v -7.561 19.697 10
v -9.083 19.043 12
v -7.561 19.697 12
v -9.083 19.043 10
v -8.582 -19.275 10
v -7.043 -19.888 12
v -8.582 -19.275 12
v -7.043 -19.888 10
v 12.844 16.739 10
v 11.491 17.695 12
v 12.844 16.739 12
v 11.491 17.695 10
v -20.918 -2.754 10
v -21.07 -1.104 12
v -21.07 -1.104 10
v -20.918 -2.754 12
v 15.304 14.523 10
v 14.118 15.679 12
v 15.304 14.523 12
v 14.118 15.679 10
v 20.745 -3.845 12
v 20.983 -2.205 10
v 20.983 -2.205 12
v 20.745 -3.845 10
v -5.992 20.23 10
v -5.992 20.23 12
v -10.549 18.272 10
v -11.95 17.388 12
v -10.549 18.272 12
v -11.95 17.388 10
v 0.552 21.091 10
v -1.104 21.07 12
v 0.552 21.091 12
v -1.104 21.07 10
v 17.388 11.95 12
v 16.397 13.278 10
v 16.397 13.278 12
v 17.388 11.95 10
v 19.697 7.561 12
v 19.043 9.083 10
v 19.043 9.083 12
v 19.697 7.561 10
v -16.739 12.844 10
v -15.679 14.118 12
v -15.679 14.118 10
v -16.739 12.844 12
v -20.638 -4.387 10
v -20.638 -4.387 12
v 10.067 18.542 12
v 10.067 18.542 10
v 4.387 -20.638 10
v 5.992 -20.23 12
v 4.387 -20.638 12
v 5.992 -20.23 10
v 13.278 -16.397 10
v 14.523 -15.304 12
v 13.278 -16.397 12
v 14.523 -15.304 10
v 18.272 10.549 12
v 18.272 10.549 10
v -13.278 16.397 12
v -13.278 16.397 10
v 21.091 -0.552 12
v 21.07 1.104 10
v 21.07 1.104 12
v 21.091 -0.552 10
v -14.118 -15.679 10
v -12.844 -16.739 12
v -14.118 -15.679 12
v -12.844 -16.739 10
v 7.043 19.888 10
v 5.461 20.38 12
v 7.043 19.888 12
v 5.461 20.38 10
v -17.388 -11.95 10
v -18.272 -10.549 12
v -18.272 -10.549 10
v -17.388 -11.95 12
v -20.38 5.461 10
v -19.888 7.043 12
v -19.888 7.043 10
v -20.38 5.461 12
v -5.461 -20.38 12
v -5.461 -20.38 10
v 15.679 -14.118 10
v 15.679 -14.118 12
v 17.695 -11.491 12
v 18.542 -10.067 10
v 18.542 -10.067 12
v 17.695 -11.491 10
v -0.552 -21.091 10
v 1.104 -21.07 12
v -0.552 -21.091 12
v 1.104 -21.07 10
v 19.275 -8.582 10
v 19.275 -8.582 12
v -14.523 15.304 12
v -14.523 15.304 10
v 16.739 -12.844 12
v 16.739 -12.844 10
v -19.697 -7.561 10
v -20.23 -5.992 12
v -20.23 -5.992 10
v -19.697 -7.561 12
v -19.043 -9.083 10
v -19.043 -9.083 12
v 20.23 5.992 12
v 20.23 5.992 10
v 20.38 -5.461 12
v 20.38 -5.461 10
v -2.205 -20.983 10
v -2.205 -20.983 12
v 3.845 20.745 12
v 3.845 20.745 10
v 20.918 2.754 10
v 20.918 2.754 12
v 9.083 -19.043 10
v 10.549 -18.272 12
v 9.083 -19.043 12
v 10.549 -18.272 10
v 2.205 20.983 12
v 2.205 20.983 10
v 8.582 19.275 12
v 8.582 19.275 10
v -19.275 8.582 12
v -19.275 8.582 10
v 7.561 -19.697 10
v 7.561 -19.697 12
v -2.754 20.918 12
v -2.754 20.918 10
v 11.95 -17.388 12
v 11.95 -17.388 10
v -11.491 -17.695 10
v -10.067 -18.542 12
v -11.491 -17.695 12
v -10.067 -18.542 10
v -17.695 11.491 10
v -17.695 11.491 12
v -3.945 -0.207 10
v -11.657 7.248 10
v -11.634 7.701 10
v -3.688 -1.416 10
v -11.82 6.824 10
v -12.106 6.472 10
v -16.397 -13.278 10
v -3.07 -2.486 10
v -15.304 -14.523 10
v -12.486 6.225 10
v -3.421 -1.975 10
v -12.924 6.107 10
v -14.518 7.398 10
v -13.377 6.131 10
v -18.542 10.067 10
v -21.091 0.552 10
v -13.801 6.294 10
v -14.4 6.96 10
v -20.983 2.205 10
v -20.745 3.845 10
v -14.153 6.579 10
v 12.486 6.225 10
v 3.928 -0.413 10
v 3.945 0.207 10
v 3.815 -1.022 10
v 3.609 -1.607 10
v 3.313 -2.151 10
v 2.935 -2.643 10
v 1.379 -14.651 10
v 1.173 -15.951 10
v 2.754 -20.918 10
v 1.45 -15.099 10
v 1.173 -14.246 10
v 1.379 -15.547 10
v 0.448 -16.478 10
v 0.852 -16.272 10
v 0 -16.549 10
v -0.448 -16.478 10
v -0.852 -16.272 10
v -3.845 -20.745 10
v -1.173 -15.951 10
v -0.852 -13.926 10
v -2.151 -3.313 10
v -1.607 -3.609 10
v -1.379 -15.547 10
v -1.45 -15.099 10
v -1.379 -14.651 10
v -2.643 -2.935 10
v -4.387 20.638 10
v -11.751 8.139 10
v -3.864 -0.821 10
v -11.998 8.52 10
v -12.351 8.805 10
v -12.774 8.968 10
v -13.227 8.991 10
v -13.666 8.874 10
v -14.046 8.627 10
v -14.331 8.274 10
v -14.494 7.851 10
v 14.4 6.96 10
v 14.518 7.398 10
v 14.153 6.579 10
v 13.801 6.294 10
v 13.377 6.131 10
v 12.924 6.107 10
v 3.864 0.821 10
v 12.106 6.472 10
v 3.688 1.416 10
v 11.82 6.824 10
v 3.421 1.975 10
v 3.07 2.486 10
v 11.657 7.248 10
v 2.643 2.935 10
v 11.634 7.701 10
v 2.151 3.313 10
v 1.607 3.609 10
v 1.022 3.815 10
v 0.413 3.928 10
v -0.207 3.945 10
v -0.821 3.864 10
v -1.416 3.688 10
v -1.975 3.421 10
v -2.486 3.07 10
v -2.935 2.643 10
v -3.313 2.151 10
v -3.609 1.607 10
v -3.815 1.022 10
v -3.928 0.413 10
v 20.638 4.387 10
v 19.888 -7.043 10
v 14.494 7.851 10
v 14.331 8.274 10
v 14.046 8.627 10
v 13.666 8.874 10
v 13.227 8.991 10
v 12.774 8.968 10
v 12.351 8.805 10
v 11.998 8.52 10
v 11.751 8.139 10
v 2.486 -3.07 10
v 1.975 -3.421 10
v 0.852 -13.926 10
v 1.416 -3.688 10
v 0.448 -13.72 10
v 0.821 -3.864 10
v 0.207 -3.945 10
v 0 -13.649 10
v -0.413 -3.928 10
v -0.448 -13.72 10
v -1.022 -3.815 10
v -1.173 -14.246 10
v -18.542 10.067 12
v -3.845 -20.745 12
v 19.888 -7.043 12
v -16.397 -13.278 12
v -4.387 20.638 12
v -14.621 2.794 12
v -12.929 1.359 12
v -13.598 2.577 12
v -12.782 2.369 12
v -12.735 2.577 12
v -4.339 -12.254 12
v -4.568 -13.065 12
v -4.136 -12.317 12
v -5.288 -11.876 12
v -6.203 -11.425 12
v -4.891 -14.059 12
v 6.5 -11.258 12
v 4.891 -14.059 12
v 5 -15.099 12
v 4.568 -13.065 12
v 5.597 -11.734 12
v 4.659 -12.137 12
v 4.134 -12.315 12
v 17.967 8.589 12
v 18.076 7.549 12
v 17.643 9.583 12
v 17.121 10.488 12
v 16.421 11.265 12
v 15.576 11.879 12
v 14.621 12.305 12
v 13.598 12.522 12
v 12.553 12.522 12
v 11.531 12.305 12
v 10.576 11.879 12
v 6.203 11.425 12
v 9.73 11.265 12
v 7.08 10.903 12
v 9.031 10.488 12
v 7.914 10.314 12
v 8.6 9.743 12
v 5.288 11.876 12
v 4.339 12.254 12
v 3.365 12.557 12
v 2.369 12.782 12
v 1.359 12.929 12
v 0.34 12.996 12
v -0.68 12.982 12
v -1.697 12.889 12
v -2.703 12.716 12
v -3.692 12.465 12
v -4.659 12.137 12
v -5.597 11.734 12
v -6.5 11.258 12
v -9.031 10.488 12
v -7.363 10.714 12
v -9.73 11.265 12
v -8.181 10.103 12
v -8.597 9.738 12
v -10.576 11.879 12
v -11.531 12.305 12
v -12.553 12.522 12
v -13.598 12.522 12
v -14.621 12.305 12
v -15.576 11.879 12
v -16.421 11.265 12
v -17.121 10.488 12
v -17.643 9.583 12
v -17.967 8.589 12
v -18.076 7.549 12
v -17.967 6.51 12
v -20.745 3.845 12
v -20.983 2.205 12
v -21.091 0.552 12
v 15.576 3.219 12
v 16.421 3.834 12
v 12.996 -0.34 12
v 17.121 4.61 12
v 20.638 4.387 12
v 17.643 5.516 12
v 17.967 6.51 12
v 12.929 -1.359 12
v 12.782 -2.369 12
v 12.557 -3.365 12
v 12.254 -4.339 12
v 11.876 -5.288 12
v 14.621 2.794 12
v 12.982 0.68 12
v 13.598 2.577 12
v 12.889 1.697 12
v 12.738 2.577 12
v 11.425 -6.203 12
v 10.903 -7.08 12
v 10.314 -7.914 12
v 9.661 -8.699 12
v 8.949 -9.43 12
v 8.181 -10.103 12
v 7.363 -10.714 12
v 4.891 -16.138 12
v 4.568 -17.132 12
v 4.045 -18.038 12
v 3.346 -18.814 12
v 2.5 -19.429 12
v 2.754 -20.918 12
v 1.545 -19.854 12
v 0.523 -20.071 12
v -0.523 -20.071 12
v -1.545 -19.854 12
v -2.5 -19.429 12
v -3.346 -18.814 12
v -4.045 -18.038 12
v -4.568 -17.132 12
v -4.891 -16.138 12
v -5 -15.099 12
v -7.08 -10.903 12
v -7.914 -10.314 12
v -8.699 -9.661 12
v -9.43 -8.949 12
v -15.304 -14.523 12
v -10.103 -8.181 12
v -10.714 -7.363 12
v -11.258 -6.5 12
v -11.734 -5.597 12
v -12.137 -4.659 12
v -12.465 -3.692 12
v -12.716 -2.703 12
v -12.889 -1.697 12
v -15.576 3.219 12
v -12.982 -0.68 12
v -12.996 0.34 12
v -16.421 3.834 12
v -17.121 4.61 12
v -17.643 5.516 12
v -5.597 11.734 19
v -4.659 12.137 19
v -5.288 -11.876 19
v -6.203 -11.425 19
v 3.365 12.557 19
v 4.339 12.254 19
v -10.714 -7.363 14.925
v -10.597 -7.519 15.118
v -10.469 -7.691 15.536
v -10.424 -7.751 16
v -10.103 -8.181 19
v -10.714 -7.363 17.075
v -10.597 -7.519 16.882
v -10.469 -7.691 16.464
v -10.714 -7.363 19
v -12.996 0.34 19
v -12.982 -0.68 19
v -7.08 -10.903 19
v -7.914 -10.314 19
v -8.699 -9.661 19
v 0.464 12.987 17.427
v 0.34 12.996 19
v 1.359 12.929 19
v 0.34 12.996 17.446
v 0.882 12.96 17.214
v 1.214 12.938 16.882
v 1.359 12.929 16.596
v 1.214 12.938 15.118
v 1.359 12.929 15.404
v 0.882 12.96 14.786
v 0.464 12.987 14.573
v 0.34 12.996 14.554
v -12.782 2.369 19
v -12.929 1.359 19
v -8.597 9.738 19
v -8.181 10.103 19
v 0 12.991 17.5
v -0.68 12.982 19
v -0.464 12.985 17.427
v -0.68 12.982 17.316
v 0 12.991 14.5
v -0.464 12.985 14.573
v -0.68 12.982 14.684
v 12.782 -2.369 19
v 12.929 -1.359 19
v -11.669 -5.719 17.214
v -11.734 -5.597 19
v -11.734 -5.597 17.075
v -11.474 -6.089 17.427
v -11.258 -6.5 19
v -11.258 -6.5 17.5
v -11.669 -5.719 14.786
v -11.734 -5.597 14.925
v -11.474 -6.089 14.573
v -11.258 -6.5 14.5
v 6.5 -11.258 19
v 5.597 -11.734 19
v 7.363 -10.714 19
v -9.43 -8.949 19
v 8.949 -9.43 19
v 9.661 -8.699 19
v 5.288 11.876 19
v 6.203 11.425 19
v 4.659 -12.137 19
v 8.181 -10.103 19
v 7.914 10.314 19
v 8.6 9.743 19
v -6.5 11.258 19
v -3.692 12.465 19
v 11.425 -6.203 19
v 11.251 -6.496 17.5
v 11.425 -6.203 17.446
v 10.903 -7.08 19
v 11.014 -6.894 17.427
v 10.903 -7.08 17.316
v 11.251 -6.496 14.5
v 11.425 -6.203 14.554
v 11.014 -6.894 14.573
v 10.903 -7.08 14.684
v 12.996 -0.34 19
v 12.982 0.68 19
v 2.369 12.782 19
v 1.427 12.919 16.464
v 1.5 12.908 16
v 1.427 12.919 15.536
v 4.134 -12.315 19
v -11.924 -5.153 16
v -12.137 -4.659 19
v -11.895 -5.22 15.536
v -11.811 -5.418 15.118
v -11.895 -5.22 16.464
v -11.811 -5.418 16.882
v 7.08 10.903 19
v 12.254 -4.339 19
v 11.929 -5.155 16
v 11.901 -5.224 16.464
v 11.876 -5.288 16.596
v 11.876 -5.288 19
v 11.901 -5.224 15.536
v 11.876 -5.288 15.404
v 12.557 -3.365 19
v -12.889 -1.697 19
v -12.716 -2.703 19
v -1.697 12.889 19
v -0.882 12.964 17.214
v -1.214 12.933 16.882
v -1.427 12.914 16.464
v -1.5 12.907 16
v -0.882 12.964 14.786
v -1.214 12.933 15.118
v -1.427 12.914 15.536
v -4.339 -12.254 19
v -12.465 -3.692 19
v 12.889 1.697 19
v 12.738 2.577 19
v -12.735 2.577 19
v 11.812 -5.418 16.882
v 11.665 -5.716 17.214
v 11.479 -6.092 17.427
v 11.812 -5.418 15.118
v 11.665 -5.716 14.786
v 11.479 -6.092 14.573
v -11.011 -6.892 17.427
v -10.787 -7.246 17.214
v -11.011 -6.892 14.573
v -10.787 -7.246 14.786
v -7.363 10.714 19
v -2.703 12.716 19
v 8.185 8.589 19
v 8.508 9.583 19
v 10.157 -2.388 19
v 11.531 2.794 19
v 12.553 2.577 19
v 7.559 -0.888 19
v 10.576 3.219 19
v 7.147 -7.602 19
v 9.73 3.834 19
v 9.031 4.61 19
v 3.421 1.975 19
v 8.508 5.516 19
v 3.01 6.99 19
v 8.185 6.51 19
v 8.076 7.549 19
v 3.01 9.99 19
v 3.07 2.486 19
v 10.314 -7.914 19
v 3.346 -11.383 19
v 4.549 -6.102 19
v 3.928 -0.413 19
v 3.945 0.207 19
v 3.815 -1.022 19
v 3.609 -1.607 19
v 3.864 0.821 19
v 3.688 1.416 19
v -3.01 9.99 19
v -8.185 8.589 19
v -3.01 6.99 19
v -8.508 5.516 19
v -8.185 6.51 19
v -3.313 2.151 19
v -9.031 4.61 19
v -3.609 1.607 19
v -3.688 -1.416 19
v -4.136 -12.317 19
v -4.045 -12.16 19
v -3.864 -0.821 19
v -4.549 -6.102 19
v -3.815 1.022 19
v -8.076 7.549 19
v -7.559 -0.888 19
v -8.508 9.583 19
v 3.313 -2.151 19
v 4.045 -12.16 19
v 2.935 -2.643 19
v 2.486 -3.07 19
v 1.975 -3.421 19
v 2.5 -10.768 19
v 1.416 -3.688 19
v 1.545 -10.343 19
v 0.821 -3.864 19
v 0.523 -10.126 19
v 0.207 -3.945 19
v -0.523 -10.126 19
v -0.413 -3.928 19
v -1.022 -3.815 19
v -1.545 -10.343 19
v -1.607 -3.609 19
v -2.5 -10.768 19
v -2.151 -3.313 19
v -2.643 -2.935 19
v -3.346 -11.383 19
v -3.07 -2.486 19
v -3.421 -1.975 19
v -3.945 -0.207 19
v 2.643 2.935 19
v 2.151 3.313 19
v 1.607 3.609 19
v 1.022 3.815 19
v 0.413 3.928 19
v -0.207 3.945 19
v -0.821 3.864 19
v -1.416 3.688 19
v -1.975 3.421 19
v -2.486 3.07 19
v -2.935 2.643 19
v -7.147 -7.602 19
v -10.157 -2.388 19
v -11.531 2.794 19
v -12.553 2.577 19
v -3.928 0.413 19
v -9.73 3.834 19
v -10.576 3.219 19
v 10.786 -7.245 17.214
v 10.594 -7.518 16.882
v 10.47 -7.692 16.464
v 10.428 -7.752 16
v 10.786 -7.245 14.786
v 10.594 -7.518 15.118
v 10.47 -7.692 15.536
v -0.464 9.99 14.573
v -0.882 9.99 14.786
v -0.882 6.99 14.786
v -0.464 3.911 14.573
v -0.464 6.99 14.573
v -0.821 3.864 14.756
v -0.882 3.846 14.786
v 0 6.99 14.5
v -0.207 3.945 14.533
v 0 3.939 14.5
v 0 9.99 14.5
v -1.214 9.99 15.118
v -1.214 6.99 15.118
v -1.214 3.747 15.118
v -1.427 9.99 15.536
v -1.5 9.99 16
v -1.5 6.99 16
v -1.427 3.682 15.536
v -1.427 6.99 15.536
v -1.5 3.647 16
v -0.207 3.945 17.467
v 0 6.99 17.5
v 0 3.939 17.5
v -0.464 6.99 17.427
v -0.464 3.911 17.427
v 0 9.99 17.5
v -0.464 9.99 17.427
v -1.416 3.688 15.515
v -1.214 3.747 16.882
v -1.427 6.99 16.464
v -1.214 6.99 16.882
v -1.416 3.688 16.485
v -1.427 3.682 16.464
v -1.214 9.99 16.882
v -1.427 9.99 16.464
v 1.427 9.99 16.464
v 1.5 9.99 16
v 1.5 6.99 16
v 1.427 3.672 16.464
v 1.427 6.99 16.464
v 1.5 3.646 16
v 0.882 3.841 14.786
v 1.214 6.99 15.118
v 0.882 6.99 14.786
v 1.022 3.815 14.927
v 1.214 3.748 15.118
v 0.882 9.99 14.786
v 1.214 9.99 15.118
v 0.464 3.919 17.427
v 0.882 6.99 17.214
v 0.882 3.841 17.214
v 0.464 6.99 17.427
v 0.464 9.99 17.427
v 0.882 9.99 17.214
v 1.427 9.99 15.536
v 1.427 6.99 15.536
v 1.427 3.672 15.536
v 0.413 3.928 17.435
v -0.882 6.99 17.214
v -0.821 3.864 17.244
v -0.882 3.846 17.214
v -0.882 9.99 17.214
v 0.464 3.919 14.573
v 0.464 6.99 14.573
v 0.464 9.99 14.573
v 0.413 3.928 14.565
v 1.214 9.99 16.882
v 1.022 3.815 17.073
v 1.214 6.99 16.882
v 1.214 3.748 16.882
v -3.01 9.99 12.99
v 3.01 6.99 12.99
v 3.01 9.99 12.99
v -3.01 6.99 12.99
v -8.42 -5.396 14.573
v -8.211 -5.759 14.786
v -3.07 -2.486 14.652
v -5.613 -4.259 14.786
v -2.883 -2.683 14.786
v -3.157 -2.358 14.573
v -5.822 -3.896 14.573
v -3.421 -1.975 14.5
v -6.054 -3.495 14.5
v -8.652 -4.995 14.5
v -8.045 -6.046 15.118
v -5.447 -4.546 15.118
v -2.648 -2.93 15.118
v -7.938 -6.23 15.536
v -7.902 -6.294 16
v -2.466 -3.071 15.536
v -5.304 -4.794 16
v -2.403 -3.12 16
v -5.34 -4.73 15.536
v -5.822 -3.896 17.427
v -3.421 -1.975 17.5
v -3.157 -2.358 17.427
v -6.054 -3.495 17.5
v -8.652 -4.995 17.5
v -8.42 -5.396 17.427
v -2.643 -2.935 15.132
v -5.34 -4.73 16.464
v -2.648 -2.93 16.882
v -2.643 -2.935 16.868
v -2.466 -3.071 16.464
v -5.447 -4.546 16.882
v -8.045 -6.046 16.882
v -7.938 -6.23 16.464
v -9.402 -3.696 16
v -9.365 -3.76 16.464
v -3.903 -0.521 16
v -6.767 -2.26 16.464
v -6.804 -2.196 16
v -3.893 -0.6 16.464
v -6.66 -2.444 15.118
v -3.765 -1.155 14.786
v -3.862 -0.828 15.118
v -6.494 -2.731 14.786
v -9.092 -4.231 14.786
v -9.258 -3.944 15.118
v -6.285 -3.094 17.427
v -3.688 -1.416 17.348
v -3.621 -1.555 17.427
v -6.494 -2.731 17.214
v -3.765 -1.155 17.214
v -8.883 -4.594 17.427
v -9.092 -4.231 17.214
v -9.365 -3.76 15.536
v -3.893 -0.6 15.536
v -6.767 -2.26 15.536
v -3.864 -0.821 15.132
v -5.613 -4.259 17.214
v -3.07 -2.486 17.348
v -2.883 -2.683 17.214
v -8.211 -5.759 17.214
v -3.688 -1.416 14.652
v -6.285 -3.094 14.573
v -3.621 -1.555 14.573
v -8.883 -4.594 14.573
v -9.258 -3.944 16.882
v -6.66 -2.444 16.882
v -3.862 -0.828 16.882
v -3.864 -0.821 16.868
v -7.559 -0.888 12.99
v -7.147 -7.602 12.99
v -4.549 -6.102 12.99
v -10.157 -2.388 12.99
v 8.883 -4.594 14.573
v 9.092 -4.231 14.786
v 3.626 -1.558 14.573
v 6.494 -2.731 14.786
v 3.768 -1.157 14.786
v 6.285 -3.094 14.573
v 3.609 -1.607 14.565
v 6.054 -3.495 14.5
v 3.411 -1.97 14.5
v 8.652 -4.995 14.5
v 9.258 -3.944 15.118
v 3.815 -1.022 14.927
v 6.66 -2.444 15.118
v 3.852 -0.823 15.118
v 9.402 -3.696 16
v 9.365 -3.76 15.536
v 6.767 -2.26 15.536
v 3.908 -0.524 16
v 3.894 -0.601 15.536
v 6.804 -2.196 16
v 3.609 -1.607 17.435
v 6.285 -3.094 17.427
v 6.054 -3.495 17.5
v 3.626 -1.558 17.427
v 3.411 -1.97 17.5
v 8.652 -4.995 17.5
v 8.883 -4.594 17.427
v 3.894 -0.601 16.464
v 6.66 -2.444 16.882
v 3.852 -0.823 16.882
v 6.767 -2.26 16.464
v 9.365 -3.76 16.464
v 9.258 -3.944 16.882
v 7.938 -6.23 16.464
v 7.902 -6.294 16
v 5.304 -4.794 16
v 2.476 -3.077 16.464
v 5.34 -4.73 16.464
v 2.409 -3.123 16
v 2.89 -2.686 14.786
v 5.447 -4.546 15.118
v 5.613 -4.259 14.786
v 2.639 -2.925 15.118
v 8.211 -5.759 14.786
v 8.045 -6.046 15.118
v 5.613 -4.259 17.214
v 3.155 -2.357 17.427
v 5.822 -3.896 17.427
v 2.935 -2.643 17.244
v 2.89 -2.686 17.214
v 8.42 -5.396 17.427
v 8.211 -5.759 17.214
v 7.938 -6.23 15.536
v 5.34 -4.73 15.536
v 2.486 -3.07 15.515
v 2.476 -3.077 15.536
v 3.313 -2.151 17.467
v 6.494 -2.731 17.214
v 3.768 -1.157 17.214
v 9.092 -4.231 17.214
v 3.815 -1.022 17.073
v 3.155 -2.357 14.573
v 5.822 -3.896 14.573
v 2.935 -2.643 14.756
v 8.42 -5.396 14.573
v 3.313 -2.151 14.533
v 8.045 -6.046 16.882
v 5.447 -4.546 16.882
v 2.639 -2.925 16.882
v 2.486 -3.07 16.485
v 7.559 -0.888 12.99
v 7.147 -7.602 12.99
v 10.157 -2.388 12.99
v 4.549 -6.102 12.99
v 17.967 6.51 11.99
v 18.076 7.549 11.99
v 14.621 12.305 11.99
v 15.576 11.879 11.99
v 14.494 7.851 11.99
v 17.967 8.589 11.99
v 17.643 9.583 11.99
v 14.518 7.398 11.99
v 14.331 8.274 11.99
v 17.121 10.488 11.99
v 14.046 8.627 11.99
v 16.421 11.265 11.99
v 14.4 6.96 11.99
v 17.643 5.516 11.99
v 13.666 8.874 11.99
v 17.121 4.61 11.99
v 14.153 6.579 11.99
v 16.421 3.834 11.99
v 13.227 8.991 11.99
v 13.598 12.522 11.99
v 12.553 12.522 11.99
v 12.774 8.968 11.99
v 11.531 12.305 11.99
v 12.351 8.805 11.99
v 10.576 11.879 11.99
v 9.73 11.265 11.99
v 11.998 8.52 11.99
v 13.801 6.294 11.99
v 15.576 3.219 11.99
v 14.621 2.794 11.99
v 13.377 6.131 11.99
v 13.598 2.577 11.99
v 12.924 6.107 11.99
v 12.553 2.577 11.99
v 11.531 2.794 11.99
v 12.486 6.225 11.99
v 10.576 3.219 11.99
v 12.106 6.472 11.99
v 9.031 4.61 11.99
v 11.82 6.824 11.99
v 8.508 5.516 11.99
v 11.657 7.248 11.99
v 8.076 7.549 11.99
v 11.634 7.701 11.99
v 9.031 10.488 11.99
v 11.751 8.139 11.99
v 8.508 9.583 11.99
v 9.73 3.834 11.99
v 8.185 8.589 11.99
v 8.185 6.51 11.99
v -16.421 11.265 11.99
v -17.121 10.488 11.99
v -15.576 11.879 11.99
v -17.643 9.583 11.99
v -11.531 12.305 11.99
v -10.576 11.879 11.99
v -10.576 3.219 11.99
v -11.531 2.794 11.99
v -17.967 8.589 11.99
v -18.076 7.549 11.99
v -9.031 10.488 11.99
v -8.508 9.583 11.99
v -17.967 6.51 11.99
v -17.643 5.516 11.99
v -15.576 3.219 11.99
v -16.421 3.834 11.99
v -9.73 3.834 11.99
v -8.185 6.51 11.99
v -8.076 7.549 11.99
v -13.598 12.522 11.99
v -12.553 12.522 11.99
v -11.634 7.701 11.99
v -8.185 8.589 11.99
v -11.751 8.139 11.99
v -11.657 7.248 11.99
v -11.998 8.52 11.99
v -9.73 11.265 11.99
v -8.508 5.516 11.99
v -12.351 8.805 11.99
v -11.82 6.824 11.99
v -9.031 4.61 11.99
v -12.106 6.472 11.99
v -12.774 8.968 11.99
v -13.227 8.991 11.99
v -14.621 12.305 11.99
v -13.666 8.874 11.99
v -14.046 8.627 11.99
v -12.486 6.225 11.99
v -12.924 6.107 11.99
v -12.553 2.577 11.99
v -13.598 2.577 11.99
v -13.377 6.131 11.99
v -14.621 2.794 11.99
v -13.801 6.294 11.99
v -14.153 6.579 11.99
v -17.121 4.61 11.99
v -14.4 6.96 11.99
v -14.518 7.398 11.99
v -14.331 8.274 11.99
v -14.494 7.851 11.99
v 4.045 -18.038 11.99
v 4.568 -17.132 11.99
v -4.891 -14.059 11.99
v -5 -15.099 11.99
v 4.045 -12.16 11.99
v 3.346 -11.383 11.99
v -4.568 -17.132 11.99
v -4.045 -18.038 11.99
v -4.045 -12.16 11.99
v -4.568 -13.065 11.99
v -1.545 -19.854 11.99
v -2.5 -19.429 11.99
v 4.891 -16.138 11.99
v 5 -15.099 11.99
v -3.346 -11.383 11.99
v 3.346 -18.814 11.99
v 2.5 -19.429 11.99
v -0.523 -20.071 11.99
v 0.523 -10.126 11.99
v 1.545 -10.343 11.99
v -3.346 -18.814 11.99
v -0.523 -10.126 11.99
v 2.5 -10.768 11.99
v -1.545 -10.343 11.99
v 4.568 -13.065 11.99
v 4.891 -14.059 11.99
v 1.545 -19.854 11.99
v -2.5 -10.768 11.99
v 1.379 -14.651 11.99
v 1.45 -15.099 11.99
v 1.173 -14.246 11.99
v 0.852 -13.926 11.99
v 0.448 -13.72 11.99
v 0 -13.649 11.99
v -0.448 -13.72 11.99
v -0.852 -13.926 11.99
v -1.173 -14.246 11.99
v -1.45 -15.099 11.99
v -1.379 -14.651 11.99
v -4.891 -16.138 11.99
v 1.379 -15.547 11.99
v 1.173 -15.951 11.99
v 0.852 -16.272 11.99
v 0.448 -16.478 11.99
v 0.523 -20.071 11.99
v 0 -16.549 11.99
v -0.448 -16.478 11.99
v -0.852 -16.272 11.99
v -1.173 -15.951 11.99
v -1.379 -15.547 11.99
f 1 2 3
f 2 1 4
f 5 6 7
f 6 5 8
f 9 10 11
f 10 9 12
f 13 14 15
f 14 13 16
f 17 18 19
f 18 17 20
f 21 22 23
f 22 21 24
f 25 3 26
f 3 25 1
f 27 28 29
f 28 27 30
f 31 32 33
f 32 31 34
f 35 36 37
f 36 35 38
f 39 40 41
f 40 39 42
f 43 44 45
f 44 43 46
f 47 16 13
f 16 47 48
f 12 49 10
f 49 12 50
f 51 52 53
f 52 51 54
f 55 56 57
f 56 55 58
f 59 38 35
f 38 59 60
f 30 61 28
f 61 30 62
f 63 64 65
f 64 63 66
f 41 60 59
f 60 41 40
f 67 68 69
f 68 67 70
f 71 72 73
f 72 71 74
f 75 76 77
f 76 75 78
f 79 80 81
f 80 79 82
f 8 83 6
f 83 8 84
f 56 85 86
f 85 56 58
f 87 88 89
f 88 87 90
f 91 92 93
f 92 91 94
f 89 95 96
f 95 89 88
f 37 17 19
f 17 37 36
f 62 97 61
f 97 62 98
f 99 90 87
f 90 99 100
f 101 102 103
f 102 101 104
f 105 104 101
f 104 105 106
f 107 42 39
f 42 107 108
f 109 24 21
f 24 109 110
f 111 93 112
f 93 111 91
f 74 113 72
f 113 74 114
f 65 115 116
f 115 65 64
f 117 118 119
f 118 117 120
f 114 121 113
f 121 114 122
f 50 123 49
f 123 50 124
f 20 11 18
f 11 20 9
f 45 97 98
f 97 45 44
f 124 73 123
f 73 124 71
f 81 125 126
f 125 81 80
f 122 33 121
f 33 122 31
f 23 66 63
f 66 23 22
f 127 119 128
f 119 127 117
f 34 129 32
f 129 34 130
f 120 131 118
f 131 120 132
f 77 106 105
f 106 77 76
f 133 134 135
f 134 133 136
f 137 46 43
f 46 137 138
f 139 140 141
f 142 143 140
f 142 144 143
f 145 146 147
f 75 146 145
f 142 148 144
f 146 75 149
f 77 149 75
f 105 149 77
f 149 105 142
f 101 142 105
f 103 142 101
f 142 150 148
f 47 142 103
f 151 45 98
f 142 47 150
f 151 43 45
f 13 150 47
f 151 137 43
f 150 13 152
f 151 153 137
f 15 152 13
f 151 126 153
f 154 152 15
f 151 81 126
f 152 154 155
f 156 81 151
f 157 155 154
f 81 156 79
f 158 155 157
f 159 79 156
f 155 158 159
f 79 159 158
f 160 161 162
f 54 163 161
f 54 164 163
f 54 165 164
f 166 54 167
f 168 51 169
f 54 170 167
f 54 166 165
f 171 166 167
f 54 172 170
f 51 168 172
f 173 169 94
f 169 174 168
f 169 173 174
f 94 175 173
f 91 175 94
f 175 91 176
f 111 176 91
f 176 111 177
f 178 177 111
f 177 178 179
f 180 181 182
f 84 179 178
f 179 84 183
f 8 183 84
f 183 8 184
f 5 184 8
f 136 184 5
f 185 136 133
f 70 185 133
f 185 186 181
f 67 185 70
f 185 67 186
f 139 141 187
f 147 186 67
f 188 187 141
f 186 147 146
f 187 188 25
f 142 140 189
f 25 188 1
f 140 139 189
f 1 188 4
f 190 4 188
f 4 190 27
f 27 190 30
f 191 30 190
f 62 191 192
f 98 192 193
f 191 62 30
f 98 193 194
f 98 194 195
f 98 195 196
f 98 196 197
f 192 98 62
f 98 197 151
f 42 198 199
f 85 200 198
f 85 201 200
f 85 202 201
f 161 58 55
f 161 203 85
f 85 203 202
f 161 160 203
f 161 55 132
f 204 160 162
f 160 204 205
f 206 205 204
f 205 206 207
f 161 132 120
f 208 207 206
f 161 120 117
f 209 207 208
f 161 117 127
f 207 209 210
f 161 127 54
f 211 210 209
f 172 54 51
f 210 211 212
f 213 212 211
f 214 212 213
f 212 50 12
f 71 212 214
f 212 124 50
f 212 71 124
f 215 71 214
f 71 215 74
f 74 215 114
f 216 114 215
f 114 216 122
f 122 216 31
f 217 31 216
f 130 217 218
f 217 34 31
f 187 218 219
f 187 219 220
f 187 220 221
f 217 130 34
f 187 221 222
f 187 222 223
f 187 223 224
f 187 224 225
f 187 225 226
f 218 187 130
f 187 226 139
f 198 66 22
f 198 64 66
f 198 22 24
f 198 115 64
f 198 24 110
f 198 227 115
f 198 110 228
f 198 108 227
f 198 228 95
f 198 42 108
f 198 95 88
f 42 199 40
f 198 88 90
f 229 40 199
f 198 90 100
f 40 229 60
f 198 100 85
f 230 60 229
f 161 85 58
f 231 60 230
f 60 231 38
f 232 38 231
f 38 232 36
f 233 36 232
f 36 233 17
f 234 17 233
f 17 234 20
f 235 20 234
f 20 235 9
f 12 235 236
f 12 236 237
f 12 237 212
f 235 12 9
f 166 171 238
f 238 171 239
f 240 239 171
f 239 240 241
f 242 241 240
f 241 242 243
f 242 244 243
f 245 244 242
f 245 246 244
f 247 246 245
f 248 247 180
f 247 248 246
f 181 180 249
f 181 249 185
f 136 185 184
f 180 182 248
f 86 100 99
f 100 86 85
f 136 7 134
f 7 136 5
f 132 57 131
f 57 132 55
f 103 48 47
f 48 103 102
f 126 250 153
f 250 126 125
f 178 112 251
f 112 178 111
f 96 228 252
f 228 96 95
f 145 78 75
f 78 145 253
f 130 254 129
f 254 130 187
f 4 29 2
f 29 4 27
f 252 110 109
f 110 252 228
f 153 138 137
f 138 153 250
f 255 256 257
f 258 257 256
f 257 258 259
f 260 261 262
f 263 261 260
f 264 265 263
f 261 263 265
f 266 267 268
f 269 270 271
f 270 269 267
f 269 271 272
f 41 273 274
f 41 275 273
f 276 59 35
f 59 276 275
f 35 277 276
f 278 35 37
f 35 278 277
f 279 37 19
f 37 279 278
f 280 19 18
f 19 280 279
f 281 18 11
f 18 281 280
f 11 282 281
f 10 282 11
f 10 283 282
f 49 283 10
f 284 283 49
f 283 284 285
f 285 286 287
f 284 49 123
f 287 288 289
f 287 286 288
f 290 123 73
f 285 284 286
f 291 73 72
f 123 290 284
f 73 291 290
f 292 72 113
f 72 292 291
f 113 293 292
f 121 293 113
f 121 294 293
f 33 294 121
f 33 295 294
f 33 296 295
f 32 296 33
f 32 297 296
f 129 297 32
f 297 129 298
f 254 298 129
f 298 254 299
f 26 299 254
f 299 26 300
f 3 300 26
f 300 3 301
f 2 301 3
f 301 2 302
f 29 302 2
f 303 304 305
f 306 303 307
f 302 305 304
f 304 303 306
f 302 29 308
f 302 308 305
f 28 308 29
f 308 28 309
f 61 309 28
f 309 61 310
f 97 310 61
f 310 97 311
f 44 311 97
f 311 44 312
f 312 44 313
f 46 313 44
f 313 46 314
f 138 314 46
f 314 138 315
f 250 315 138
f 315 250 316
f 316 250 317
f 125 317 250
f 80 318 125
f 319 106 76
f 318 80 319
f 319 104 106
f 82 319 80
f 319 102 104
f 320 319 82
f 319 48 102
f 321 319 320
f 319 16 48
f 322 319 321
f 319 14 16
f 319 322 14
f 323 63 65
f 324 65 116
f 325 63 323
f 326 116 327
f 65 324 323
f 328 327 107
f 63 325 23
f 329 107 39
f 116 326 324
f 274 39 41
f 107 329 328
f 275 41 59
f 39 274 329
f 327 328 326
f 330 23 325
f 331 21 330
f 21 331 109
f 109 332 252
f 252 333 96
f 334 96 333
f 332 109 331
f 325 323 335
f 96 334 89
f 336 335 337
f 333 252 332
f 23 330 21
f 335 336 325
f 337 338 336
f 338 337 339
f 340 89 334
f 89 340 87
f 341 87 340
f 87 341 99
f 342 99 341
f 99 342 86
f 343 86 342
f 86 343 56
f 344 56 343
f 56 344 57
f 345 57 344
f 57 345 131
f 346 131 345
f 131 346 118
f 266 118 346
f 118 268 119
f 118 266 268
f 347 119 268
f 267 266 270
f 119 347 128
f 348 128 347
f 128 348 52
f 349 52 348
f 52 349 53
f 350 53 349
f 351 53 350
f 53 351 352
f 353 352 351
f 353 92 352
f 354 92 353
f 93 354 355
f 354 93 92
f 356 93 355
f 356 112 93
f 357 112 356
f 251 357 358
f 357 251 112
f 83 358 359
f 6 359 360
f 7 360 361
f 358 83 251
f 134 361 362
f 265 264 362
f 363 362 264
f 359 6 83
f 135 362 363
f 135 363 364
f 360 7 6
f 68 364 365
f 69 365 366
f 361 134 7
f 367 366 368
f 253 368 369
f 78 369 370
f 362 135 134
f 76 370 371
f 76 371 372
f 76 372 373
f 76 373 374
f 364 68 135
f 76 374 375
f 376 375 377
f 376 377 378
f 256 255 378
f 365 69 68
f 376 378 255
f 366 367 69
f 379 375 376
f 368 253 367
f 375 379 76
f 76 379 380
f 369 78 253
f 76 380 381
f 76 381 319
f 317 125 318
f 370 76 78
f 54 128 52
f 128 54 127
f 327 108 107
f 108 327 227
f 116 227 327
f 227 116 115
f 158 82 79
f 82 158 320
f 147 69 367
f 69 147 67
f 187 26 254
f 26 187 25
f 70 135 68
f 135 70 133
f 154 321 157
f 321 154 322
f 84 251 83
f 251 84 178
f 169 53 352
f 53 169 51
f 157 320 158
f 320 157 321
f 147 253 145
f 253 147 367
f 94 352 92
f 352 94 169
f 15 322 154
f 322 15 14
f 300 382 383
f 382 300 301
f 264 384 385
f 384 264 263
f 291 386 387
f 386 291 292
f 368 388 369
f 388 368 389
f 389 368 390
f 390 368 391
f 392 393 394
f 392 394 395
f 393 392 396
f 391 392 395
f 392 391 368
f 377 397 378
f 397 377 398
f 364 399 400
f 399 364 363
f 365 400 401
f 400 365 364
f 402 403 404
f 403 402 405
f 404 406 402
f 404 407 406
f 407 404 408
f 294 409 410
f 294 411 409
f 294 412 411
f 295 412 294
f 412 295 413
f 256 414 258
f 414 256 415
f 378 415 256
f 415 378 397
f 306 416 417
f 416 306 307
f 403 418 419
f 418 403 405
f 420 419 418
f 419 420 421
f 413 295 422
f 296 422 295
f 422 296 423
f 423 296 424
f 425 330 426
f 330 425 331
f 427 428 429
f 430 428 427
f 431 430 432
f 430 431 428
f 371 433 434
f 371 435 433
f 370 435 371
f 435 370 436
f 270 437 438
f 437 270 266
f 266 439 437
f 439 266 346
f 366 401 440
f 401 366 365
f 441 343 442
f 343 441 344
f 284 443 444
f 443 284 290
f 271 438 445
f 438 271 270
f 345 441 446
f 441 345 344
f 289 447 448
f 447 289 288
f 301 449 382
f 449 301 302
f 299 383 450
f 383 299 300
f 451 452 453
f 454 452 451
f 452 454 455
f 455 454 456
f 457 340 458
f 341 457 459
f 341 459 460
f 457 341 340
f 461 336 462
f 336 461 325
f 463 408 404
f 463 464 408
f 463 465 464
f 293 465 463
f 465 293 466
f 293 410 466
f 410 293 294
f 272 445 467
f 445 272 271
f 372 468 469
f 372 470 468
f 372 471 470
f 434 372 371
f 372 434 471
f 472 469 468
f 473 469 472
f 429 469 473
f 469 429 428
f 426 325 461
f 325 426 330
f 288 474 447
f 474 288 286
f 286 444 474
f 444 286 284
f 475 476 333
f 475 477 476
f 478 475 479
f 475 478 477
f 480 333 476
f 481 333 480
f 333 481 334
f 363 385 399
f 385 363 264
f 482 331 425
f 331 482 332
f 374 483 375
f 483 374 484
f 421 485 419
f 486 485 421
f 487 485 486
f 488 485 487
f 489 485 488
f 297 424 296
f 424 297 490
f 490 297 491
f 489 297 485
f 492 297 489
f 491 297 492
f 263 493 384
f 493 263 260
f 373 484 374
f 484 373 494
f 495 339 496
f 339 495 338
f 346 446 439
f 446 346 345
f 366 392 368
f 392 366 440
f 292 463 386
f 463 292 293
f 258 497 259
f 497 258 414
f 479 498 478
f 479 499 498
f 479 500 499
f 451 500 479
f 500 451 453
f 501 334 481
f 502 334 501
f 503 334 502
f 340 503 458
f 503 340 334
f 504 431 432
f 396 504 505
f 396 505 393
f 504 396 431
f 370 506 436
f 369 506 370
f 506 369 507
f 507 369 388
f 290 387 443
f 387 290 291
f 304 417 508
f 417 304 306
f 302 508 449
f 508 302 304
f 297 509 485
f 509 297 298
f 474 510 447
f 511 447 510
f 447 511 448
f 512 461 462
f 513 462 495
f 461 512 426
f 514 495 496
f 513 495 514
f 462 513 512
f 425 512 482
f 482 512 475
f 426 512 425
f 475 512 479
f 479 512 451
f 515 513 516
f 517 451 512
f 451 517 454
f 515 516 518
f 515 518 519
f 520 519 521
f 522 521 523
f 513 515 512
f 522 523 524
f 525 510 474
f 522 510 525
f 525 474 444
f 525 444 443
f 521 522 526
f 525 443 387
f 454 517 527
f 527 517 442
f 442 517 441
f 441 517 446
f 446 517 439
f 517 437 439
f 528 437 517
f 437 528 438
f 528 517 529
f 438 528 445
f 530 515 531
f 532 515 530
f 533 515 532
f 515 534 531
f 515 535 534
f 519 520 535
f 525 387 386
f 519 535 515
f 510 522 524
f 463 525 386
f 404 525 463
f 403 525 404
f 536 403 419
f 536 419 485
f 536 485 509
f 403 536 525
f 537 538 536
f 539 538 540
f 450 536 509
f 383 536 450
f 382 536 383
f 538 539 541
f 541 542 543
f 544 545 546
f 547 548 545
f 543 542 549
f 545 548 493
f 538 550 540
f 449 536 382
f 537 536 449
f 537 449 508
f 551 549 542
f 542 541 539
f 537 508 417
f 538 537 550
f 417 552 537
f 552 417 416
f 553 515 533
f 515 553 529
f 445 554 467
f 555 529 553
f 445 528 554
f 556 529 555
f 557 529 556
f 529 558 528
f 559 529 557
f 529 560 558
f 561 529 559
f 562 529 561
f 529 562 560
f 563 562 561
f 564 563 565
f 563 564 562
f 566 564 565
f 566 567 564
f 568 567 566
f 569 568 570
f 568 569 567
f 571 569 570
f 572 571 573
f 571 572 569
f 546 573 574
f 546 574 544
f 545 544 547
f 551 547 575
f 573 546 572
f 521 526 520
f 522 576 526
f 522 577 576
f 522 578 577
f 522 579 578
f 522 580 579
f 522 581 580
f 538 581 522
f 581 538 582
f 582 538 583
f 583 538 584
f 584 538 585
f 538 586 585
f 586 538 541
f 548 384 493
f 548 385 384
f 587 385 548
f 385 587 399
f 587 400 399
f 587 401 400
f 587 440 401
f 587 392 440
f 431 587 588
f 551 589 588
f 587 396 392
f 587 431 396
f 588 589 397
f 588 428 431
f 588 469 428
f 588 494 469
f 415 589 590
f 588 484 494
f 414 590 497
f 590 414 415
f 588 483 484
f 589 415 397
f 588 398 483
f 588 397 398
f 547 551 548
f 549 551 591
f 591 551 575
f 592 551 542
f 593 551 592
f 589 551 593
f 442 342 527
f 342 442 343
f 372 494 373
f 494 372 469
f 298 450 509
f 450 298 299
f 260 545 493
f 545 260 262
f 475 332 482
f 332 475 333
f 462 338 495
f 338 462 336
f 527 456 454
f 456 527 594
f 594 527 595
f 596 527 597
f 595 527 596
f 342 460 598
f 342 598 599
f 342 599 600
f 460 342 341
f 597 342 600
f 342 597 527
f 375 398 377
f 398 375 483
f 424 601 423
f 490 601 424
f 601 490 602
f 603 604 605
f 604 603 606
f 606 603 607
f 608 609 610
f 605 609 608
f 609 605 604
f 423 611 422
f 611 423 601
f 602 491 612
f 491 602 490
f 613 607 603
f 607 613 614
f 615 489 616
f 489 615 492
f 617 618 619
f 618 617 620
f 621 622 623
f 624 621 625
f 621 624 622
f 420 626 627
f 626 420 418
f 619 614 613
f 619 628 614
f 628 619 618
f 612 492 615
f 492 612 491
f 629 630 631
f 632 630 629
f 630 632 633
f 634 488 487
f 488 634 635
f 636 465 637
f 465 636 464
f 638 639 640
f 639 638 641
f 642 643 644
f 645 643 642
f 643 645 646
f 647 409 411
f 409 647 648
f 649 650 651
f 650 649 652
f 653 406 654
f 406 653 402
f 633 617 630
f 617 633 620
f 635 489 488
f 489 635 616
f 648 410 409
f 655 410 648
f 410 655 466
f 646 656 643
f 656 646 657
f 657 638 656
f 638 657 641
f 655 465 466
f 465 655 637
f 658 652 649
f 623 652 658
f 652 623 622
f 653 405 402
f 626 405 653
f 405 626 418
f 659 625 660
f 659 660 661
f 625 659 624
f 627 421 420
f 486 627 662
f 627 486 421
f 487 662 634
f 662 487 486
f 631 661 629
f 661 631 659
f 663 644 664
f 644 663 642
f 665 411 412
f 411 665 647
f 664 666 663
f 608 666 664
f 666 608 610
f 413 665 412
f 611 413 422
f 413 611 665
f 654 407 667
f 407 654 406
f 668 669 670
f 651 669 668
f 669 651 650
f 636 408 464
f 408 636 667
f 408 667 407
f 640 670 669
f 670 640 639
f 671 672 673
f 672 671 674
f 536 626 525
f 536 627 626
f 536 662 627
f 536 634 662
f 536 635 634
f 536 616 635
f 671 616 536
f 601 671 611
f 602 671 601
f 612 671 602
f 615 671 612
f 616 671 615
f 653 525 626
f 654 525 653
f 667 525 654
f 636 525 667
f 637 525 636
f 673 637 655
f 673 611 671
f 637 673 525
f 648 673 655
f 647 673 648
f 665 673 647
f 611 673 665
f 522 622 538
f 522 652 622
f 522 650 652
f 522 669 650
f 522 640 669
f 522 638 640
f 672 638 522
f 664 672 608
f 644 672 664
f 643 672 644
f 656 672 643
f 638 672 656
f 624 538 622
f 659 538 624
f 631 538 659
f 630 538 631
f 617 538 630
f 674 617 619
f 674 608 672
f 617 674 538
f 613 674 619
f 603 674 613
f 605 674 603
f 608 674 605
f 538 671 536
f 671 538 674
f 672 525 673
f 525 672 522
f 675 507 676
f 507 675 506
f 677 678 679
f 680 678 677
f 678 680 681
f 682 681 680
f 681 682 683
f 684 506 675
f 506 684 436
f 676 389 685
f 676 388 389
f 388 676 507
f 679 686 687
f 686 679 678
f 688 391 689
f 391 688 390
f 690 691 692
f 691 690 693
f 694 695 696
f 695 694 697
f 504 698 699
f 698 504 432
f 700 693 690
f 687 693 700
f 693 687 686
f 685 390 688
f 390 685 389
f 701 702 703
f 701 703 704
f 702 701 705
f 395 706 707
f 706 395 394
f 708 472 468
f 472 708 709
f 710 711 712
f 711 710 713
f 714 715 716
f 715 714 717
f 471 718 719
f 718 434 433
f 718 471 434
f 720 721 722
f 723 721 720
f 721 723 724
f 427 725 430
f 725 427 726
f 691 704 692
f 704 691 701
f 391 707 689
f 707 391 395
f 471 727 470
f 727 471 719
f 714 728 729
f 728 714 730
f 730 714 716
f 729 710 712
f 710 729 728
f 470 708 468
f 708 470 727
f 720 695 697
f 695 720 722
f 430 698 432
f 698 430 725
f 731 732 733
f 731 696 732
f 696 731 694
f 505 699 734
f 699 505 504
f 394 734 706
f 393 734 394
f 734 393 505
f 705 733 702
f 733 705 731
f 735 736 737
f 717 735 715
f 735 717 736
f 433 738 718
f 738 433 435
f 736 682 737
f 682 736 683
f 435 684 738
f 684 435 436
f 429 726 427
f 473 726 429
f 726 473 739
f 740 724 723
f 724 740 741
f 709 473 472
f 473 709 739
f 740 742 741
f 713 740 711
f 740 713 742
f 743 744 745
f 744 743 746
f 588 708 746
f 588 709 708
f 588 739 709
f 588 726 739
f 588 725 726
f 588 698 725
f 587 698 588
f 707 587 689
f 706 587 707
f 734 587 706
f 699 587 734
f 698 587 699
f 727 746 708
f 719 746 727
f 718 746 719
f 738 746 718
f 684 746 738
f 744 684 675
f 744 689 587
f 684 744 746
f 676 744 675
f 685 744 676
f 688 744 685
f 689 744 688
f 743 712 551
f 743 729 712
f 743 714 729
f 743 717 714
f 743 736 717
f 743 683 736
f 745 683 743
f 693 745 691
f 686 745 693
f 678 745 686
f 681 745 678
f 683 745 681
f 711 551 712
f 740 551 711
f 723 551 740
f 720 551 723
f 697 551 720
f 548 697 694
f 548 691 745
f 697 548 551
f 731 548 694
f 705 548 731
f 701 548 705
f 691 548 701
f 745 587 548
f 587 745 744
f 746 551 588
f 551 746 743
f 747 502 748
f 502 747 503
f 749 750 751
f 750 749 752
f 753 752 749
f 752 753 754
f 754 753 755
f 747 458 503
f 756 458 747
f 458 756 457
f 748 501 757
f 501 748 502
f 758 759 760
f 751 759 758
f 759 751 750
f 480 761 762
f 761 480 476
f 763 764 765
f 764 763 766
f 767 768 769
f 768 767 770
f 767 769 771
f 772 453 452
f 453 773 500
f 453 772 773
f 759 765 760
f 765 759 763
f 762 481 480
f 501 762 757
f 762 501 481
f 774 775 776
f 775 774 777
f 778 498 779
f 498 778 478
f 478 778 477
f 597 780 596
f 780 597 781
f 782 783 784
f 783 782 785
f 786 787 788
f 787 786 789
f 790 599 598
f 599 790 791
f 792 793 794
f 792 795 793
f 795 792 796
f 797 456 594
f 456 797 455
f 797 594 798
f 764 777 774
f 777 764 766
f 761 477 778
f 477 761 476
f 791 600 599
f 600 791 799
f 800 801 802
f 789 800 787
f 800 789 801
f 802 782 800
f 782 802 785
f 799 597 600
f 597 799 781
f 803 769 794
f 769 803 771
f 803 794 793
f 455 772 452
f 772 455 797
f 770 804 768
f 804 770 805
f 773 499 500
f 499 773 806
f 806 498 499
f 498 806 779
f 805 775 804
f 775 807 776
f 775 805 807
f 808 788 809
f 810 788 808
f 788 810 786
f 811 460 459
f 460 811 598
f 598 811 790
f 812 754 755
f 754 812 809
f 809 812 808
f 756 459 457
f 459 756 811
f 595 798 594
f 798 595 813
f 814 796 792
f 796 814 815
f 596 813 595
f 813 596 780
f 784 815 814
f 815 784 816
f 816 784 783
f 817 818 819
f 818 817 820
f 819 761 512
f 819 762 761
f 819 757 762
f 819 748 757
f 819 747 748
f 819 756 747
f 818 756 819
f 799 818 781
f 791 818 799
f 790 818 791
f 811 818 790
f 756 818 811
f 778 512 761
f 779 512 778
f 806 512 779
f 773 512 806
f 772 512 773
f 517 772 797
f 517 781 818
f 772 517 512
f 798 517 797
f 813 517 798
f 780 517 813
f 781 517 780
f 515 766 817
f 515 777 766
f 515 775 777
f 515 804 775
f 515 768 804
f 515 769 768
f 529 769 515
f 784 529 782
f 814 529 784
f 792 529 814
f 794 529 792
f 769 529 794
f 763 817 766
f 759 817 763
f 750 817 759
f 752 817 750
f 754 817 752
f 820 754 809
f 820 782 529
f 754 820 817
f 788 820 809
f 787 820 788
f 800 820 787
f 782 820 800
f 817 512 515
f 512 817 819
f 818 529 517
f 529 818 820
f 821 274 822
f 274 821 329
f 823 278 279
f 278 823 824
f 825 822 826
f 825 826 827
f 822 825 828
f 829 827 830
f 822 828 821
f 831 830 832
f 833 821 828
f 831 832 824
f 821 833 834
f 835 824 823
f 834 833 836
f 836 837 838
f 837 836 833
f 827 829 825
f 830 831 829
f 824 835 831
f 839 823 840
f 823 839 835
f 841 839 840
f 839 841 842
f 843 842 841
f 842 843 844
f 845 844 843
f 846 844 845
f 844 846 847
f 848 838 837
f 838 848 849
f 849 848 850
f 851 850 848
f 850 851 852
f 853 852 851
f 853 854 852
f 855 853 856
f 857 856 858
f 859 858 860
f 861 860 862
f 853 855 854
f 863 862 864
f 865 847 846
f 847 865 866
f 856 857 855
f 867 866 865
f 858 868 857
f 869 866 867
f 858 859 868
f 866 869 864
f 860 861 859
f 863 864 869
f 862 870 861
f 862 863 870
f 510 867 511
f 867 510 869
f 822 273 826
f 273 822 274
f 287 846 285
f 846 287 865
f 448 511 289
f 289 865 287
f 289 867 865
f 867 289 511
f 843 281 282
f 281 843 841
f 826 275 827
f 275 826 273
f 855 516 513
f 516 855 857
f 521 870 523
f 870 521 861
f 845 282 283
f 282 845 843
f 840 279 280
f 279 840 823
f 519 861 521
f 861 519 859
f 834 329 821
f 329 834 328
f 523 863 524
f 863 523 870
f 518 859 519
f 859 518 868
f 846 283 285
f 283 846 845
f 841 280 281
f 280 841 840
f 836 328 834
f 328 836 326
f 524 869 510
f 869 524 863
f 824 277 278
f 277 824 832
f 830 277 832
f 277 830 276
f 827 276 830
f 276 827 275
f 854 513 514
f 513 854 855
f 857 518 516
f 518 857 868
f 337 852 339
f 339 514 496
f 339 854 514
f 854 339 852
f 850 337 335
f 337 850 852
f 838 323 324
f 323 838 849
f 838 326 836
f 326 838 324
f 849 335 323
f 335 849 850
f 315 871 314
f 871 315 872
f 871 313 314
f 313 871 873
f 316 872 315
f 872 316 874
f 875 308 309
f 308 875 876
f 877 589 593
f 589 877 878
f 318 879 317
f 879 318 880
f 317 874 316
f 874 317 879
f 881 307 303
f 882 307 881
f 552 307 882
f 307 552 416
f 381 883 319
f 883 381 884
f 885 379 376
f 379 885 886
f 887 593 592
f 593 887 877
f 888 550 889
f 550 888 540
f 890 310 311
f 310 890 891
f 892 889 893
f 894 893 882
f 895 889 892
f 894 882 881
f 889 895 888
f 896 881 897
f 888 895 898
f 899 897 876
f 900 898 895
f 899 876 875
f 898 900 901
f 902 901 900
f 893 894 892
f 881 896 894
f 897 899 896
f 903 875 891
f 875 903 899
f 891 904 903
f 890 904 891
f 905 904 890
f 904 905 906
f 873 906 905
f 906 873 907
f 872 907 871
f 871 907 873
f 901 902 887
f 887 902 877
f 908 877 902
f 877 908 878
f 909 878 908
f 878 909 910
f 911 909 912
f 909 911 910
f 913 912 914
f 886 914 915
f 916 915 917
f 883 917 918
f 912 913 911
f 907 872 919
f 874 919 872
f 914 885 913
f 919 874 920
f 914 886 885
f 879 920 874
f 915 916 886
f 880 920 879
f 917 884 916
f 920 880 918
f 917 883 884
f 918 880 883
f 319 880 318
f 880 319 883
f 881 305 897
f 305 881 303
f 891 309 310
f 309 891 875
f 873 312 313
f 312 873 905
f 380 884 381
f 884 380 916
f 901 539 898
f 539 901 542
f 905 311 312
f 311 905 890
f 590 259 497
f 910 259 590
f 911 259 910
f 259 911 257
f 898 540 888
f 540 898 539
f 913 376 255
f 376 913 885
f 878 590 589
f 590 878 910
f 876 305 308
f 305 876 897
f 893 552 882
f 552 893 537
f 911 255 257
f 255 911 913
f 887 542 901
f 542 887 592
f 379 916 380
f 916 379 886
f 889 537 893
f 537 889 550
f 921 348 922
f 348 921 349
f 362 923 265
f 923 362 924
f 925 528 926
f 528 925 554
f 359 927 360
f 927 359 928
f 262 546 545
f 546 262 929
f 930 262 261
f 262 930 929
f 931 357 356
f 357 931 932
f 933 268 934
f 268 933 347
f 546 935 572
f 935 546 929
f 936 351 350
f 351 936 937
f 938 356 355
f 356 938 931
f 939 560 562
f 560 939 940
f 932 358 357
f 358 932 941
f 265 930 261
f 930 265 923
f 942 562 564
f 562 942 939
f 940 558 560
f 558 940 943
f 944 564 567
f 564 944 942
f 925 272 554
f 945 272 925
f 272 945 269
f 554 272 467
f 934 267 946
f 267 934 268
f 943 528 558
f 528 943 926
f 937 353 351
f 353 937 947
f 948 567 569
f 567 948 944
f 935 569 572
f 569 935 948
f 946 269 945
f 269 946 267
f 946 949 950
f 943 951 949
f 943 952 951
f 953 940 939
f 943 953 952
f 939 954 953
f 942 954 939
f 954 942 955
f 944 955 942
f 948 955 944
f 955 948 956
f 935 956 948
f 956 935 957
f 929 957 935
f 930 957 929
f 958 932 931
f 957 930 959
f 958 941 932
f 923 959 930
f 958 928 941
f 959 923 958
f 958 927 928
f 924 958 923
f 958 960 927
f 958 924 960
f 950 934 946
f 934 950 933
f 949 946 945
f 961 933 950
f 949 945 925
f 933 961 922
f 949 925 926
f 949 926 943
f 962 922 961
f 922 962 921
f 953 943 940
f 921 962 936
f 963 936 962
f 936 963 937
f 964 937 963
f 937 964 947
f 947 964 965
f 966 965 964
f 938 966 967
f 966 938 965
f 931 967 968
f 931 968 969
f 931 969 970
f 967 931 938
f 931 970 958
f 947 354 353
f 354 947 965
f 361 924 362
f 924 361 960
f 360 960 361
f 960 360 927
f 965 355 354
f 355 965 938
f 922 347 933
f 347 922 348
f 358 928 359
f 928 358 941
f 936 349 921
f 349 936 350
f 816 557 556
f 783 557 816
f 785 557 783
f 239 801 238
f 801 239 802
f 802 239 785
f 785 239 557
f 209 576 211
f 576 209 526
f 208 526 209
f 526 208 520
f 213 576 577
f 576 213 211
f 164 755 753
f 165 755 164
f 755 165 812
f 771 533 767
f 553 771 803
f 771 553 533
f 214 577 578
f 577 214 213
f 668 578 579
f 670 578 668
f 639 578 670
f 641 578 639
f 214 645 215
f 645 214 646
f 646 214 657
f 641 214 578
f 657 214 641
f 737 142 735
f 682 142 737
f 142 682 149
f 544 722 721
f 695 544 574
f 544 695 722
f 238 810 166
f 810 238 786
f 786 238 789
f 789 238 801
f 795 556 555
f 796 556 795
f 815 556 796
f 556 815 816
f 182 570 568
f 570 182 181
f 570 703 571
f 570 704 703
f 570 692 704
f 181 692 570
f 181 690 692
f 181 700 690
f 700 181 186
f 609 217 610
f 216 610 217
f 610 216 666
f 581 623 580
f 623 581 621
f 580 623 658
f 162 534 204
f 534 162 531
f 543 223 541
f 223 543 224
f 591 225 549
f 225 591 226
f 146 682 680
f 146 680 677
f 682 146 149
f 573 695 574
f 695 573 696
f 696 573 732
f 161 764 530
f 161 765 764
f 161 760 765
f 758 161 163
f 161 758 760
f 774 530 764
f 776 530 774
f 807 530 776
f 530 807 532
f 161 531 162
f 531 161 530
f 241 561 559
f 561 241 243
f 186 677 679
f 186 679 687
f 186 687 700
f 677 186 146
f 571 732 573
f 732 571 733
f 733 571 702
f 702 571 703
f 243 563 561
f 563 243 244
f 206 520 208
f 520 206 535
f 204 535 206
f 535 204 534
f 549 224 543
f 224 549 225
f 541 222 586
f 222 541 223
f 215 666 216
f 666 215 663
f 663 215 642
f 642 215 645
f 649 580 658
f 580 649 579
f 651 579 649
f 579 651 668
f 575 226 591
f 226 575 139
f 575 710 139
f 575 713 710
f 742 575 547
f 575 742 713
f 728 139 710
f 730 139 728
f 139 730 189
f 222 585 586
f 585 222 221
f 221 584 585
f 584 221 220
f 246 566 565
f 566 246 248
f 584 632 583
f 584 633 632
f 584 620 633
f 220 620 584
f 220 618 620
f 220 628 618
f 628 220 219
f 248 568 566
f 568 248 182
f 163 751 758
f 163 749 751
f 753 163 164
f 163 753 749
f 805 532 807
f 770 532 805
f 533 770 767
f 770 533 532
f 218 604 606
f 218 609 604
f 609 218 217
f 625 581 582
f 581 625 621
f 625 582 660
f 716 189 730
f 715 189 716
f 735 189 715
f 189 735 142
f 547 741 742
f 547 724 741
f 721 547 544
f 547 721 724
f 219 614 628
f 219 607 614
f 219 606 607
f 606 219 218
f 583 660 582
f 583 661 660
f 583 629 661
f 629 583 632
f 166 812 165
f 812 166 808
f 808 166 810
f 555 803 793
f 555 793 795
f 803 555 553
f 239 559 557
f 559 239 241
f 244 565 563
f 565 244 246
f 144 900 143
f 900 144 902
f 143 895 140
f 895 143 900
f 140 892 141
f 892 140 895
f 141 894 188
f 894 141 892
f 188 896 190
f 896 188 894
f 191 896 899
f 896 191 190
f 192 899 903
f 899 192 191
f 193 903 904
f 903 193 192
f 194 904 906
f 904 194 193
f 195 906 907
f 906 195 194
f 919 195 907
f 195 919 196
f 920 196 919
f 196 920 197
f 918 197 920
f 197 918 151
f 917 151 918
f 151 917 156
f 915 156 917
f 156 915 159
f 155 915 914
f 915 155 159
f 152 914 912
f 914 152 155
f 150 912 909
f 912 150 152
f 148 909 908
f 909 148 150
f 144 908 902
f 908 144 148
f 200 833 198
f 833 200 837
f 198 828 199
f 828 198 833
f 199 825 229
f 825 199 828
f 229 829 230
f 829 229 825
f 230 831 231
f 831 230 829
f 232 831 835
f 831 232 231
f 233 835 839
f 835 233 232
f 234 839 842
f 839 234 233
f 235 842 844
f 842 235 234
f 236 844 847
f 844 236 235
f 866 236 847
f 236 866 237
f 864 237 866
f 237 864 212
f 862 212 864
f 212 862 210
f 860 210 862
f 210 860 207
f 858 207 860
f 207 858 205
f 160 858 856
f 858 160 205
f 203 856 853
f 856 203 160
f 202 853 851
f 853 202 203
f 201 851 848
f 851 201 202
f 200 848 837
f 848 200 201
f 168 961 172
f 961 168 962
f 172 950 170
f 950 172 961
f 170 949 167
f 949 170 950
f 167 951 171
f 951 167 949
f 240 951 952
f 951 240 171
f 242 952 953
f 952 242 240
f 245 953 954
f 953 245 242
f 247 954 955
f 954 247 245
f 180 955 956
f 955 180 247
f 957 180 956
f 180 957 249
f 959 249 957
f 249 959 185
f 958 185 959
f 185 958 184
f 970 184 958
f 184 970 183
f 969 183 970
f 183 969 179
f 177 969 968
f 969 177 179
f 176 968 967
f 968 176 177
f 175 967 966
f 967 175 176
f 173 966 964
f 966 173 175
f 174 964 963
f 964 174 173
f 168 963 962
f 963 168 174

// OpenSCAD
teeth=60;
circ=2*teeth;
id=7.9;
od=(2*teeth)/PI;
rint=360/teeth;
littled=2.9;
loff=max(id-.25,(od/2)-4);
echo(str("OD:",od," loff:",loff));
holepos=[0:120:359];
shaftnotch=0;
mountholes=3;
shaftslot=0;

*for(x=[0,od+1]) translate([0,x]) rotate([0,0,-60]) gear2d(0);
*for(x=[0,od+1]) translate([0,-x-od-1]) rotate([0,0,60]) gear2d(1);
translate([0,0,7]) linear_extrude(7) gear2d();
*translate([0,0,3]) gear_mid();
*gear_top2();
translate([0,0,18]) mirror([0,0,1]) gear_top2();
!translate([0,0,10]) rotate([0,0,30]) gear_bottom();
module gear_bottom() {
  difference() {
    union() {
      cylinder(d=od+4,h=2,$fn=80);
      cylinder(d=26,h=9,$fn=80);
      translate([0,0,2]) cylinder(d=16,h=7,$fn=60);
      rotate([0,0,60]) for(r=[0:120:359])
          rotate([0,0,r]) translate([4,-6,2])
          *translate([0,1]) cube([10,10,7]);
      *translate([0,0,4]) cylinder(d=14,h=6,$fn=50);
    }
    rotate([0,0,60]) for(r=[0:120:359])
        rotate([0,0,r]) translate([4,-6,3])
          translate([-.01,6,3]) rotate([0,90,0]) {
            translate([0,0,-2]) cylinder(d=3,h=20,$fn=20);
            translate([-3.01,-3.01,3]) cube([6.02,6.02,3]);
          }

    for(r=[0:120:359])
      rotate([0,0,r]) translate([loff,0,0]) rotate([0,0,-30]) { 
        *cylinder(d=7.2,h=4,$fn=6);
        translate([0,0,1.99]) cylinder(d=10,h=20,$fn=30);
      }
    translate([0,0,-.01]) {
      cylinder(d=id,h=20,$fn=40);
      linear_extrude(20.02,convexity=3) holes();
    }
  }
}
module gear_mid() {
  color("blue") linear_extrude(3) gear2d(shaftslot=0);
  color("red") translate([0,0,3]) linear_extrude(3,convexity=3) gear2d(shaftslot=1);
  color("blue") translate([0,0,6]) linear_extrude(6) gear2d(shaftslot=0);
}
module gear_top2()
{
  difference() {
    union() {
      cylinder(d=od+4,h=3,$fn=80);
      translate([0,0,3]) cylinder(d1=od+4,d2=od+2,h=1,$fn=80);
    }
    *for(r=holepos)
      rotate([0,0,r+30]) translate([loff,0,-.01]) translate([-2.7,-2.7]) {
        cube([5.4,5.4,2.1]);
        difference() {
          cube([5.4,5.4,2.4]);
          mirrorx(5.4) cube([1.4,5.4,2.4]); //cylinder(d=6,h=2.4,$fn=30);
        }
      }

    *translate([0,0,3]) cylinder(d=od+.6,h=2,$fn=80);
    translate([0,0,-.01]) linear_extrude(20,convexity=3) rotate([0,0,30]) holes(extra=0.2);
  }
}
module gear_top()
{
  rotate([0,0,30]) difference() {
    union() {
    cylinder(d1=od+4,d2=od+4,h=1.4,$fn=80);
      translate([0,0,1.4]) cylinder(d1=od+4,d2=od+3,h=1,$fn=80);
    }
    translate([0,0,-.01]) {
      for(r=holepos) rotate([0,0,r]) translate([loff,0]) {
        cylinder(d1=7,d2=3,h=2,$fn=30);
        translate([0,0,1.99]) cylinder(d=3,h=1,$fn=30);
      }
      cylinder(d=id,h=3,$fn=40);
    }
    *cylinder(d=id,h=5.02,$fn=40);
    *for(r=[0:120:359])
      rotate([0,0,r]) translate([loff,0,4]) cylinder(d1=5.2,d2=3,h=1.02,$fn=20);
  }
  *rotate([0,0,-30]) translate([0,6,2]) linear_extrude(1) text(str(teeth),size=8,halign="center");
  translate([0,0,1.9]) linear_extrude(1) gear2d();
}
module gear_top_2d()
{
  rotate([0,0,30]) difference() {
    circle(d=od+4,d2=od+4,h=2,$fn=80);
    holes();
    rotate([0,0,-30]) translate([0,6]) text(str(teeth),size=8,halign="center");
  }
}
module gear2d(shaftslot=0) {
  *difference() { circle(d=od+3,$fn=80); circle(d=od+2,$fn=80); }
  rotate([0,0,30]) difference()
  {
    union() {
      circle(d=od-1.4,$fn=80);
      for(tooth=[0:teeth-1]) rotate([0,0,tooth*rint])
      translate([od/2-.8,-.5]) {
        //hull()
        {
          polygon([[0,0],[1,0.2],[1,0.8],[0,1]]);
          //translate([0,0]) square([1,1]);
        }
      }
    }
    holes(shaftslot);
    *rotate([0,0,-30]) translate([0,5]) text(str(teeth),size=8,halign="center");
  }
}
module holes(shaftslot=shaftslot,extra=0) {
    if(mountholes)
    for(r=holepos)
      rotate([0,0,r]) translate([loff,0]) circle(d=littled,$fn=20);
    difference() {
      circle(d=id+extra,$fn=40);
      if(shaftnotch) rotate([0,0,30]) translate([id*-.5-.01,id*-.5-.01]) square([id+.02,.6]);
    }
    if(shaftslot)
      for(r=[0:shaftslot])
      rotate([0,0,-60-120*r]) translate([0,-1.5,0]) {
        if(shaftslot==1&&r==0||(r==1&&shaftslot==2))
          square([od,3]);
        translate([4,-1.5]) square([2.8,6]);
      }
}
module mirrorx(off=0)
{
  translate([off/2,0]) for(m=[0,1]) mirror([m,0]) translate([off/-2,0]) children();
}
module mirrory(off=0)
{
  translate([0,off/2,0]) for(m=[0,1]) mirror([0,m,0]) translate([0,off/-2,0]) children();
}
module mirrorz(off=0)
{
  translate([0,0,off/2]) for(m=[0,1]) mirror([0,0,m]) translate([0,0,off/-2]) children();
}
